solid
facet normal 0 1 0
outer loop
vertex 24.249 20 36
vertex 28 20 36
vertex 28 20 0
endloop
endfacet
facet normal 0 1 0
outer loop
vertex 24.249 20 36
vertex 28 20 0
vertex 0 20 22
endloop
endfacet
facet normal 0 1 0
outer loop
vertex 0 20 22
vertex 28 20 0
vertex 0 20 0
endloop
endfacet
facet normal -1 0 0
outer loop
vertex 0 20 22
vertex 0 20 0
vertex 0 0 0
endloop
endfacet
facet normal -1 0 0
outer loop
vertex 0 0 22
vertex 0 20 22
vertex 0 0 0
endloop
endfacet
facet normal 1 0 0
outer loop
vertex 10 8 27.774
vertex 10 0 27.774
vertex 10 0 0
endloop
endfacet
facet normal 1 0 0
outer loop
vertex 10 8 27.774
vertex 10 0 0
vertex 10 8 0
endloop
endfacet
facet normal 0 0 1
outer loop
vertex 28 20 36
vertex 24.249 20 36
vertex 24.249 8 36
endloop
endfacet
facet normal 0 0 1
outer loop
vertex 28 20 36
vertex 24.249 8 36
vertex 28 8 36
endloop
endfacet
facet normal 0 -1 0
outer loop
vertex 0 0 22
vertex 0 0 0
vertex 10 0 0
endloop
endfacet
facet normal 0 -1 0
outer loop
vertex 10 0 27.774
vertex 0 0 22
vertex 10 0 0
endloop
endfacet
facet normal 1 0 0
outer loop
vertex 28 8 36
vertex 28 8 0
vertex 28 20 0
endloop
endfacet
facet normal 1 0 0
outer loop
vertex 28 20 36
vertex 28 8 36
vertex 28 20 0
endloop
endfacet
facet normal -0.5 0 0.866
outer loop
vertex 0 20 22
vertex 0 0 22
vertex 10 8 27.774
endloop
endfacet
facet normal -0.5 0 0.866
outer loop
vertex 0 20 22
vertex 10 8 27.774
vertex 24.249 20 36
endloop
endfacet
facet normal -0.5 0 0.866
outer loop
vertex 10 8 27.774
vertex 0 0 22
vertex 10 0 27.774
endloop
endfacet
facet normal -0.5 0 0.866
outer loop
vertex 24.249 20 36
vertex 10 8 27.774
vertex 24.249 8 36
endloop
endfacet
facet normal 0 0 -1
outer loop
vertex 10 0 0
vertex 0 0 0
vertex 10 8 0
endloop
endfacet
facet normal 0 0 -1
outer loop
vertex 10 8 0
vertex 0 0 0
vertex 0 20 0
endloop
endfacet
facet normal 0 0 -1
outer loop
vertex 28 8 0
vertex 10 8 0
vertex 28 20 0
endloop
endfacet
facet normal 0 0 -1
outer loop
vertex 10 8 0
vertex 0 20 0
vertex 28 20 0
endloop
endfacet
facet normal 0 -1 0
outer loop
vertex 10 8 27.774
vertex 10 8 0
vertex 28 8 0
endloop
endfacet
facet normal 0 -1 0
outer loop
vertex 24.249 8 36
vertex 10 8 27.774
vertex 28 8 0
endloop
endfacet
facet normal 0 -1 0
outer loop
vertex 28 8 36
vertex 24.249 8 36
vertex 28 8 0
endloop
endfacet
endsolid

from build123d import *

# Parameters (mm, degrees)
F1_DEPTH = 36
F3_DEPTH = 20.001


with BuildPart() as f1:
    # F0 (on Top) → F1 (new body)
    with BuildSketch(Plane.XY):
        Polygon((0, 20), (0, 0), (10, 0), (10, 8), (28, 8), (28, 20), align=None)
    extrude(amount=F1_DEPTH)

    # F2 (on Front) → F3 (cut, through all)
    with BuildSketch(Plane.XZ):
        Polygon((24.248711, 36), (0, 36), (0, 22), align=None)
    extrude(amount=-F3_DEPTH, mode=Mode.SUBTRACT)


solid = f1.part
